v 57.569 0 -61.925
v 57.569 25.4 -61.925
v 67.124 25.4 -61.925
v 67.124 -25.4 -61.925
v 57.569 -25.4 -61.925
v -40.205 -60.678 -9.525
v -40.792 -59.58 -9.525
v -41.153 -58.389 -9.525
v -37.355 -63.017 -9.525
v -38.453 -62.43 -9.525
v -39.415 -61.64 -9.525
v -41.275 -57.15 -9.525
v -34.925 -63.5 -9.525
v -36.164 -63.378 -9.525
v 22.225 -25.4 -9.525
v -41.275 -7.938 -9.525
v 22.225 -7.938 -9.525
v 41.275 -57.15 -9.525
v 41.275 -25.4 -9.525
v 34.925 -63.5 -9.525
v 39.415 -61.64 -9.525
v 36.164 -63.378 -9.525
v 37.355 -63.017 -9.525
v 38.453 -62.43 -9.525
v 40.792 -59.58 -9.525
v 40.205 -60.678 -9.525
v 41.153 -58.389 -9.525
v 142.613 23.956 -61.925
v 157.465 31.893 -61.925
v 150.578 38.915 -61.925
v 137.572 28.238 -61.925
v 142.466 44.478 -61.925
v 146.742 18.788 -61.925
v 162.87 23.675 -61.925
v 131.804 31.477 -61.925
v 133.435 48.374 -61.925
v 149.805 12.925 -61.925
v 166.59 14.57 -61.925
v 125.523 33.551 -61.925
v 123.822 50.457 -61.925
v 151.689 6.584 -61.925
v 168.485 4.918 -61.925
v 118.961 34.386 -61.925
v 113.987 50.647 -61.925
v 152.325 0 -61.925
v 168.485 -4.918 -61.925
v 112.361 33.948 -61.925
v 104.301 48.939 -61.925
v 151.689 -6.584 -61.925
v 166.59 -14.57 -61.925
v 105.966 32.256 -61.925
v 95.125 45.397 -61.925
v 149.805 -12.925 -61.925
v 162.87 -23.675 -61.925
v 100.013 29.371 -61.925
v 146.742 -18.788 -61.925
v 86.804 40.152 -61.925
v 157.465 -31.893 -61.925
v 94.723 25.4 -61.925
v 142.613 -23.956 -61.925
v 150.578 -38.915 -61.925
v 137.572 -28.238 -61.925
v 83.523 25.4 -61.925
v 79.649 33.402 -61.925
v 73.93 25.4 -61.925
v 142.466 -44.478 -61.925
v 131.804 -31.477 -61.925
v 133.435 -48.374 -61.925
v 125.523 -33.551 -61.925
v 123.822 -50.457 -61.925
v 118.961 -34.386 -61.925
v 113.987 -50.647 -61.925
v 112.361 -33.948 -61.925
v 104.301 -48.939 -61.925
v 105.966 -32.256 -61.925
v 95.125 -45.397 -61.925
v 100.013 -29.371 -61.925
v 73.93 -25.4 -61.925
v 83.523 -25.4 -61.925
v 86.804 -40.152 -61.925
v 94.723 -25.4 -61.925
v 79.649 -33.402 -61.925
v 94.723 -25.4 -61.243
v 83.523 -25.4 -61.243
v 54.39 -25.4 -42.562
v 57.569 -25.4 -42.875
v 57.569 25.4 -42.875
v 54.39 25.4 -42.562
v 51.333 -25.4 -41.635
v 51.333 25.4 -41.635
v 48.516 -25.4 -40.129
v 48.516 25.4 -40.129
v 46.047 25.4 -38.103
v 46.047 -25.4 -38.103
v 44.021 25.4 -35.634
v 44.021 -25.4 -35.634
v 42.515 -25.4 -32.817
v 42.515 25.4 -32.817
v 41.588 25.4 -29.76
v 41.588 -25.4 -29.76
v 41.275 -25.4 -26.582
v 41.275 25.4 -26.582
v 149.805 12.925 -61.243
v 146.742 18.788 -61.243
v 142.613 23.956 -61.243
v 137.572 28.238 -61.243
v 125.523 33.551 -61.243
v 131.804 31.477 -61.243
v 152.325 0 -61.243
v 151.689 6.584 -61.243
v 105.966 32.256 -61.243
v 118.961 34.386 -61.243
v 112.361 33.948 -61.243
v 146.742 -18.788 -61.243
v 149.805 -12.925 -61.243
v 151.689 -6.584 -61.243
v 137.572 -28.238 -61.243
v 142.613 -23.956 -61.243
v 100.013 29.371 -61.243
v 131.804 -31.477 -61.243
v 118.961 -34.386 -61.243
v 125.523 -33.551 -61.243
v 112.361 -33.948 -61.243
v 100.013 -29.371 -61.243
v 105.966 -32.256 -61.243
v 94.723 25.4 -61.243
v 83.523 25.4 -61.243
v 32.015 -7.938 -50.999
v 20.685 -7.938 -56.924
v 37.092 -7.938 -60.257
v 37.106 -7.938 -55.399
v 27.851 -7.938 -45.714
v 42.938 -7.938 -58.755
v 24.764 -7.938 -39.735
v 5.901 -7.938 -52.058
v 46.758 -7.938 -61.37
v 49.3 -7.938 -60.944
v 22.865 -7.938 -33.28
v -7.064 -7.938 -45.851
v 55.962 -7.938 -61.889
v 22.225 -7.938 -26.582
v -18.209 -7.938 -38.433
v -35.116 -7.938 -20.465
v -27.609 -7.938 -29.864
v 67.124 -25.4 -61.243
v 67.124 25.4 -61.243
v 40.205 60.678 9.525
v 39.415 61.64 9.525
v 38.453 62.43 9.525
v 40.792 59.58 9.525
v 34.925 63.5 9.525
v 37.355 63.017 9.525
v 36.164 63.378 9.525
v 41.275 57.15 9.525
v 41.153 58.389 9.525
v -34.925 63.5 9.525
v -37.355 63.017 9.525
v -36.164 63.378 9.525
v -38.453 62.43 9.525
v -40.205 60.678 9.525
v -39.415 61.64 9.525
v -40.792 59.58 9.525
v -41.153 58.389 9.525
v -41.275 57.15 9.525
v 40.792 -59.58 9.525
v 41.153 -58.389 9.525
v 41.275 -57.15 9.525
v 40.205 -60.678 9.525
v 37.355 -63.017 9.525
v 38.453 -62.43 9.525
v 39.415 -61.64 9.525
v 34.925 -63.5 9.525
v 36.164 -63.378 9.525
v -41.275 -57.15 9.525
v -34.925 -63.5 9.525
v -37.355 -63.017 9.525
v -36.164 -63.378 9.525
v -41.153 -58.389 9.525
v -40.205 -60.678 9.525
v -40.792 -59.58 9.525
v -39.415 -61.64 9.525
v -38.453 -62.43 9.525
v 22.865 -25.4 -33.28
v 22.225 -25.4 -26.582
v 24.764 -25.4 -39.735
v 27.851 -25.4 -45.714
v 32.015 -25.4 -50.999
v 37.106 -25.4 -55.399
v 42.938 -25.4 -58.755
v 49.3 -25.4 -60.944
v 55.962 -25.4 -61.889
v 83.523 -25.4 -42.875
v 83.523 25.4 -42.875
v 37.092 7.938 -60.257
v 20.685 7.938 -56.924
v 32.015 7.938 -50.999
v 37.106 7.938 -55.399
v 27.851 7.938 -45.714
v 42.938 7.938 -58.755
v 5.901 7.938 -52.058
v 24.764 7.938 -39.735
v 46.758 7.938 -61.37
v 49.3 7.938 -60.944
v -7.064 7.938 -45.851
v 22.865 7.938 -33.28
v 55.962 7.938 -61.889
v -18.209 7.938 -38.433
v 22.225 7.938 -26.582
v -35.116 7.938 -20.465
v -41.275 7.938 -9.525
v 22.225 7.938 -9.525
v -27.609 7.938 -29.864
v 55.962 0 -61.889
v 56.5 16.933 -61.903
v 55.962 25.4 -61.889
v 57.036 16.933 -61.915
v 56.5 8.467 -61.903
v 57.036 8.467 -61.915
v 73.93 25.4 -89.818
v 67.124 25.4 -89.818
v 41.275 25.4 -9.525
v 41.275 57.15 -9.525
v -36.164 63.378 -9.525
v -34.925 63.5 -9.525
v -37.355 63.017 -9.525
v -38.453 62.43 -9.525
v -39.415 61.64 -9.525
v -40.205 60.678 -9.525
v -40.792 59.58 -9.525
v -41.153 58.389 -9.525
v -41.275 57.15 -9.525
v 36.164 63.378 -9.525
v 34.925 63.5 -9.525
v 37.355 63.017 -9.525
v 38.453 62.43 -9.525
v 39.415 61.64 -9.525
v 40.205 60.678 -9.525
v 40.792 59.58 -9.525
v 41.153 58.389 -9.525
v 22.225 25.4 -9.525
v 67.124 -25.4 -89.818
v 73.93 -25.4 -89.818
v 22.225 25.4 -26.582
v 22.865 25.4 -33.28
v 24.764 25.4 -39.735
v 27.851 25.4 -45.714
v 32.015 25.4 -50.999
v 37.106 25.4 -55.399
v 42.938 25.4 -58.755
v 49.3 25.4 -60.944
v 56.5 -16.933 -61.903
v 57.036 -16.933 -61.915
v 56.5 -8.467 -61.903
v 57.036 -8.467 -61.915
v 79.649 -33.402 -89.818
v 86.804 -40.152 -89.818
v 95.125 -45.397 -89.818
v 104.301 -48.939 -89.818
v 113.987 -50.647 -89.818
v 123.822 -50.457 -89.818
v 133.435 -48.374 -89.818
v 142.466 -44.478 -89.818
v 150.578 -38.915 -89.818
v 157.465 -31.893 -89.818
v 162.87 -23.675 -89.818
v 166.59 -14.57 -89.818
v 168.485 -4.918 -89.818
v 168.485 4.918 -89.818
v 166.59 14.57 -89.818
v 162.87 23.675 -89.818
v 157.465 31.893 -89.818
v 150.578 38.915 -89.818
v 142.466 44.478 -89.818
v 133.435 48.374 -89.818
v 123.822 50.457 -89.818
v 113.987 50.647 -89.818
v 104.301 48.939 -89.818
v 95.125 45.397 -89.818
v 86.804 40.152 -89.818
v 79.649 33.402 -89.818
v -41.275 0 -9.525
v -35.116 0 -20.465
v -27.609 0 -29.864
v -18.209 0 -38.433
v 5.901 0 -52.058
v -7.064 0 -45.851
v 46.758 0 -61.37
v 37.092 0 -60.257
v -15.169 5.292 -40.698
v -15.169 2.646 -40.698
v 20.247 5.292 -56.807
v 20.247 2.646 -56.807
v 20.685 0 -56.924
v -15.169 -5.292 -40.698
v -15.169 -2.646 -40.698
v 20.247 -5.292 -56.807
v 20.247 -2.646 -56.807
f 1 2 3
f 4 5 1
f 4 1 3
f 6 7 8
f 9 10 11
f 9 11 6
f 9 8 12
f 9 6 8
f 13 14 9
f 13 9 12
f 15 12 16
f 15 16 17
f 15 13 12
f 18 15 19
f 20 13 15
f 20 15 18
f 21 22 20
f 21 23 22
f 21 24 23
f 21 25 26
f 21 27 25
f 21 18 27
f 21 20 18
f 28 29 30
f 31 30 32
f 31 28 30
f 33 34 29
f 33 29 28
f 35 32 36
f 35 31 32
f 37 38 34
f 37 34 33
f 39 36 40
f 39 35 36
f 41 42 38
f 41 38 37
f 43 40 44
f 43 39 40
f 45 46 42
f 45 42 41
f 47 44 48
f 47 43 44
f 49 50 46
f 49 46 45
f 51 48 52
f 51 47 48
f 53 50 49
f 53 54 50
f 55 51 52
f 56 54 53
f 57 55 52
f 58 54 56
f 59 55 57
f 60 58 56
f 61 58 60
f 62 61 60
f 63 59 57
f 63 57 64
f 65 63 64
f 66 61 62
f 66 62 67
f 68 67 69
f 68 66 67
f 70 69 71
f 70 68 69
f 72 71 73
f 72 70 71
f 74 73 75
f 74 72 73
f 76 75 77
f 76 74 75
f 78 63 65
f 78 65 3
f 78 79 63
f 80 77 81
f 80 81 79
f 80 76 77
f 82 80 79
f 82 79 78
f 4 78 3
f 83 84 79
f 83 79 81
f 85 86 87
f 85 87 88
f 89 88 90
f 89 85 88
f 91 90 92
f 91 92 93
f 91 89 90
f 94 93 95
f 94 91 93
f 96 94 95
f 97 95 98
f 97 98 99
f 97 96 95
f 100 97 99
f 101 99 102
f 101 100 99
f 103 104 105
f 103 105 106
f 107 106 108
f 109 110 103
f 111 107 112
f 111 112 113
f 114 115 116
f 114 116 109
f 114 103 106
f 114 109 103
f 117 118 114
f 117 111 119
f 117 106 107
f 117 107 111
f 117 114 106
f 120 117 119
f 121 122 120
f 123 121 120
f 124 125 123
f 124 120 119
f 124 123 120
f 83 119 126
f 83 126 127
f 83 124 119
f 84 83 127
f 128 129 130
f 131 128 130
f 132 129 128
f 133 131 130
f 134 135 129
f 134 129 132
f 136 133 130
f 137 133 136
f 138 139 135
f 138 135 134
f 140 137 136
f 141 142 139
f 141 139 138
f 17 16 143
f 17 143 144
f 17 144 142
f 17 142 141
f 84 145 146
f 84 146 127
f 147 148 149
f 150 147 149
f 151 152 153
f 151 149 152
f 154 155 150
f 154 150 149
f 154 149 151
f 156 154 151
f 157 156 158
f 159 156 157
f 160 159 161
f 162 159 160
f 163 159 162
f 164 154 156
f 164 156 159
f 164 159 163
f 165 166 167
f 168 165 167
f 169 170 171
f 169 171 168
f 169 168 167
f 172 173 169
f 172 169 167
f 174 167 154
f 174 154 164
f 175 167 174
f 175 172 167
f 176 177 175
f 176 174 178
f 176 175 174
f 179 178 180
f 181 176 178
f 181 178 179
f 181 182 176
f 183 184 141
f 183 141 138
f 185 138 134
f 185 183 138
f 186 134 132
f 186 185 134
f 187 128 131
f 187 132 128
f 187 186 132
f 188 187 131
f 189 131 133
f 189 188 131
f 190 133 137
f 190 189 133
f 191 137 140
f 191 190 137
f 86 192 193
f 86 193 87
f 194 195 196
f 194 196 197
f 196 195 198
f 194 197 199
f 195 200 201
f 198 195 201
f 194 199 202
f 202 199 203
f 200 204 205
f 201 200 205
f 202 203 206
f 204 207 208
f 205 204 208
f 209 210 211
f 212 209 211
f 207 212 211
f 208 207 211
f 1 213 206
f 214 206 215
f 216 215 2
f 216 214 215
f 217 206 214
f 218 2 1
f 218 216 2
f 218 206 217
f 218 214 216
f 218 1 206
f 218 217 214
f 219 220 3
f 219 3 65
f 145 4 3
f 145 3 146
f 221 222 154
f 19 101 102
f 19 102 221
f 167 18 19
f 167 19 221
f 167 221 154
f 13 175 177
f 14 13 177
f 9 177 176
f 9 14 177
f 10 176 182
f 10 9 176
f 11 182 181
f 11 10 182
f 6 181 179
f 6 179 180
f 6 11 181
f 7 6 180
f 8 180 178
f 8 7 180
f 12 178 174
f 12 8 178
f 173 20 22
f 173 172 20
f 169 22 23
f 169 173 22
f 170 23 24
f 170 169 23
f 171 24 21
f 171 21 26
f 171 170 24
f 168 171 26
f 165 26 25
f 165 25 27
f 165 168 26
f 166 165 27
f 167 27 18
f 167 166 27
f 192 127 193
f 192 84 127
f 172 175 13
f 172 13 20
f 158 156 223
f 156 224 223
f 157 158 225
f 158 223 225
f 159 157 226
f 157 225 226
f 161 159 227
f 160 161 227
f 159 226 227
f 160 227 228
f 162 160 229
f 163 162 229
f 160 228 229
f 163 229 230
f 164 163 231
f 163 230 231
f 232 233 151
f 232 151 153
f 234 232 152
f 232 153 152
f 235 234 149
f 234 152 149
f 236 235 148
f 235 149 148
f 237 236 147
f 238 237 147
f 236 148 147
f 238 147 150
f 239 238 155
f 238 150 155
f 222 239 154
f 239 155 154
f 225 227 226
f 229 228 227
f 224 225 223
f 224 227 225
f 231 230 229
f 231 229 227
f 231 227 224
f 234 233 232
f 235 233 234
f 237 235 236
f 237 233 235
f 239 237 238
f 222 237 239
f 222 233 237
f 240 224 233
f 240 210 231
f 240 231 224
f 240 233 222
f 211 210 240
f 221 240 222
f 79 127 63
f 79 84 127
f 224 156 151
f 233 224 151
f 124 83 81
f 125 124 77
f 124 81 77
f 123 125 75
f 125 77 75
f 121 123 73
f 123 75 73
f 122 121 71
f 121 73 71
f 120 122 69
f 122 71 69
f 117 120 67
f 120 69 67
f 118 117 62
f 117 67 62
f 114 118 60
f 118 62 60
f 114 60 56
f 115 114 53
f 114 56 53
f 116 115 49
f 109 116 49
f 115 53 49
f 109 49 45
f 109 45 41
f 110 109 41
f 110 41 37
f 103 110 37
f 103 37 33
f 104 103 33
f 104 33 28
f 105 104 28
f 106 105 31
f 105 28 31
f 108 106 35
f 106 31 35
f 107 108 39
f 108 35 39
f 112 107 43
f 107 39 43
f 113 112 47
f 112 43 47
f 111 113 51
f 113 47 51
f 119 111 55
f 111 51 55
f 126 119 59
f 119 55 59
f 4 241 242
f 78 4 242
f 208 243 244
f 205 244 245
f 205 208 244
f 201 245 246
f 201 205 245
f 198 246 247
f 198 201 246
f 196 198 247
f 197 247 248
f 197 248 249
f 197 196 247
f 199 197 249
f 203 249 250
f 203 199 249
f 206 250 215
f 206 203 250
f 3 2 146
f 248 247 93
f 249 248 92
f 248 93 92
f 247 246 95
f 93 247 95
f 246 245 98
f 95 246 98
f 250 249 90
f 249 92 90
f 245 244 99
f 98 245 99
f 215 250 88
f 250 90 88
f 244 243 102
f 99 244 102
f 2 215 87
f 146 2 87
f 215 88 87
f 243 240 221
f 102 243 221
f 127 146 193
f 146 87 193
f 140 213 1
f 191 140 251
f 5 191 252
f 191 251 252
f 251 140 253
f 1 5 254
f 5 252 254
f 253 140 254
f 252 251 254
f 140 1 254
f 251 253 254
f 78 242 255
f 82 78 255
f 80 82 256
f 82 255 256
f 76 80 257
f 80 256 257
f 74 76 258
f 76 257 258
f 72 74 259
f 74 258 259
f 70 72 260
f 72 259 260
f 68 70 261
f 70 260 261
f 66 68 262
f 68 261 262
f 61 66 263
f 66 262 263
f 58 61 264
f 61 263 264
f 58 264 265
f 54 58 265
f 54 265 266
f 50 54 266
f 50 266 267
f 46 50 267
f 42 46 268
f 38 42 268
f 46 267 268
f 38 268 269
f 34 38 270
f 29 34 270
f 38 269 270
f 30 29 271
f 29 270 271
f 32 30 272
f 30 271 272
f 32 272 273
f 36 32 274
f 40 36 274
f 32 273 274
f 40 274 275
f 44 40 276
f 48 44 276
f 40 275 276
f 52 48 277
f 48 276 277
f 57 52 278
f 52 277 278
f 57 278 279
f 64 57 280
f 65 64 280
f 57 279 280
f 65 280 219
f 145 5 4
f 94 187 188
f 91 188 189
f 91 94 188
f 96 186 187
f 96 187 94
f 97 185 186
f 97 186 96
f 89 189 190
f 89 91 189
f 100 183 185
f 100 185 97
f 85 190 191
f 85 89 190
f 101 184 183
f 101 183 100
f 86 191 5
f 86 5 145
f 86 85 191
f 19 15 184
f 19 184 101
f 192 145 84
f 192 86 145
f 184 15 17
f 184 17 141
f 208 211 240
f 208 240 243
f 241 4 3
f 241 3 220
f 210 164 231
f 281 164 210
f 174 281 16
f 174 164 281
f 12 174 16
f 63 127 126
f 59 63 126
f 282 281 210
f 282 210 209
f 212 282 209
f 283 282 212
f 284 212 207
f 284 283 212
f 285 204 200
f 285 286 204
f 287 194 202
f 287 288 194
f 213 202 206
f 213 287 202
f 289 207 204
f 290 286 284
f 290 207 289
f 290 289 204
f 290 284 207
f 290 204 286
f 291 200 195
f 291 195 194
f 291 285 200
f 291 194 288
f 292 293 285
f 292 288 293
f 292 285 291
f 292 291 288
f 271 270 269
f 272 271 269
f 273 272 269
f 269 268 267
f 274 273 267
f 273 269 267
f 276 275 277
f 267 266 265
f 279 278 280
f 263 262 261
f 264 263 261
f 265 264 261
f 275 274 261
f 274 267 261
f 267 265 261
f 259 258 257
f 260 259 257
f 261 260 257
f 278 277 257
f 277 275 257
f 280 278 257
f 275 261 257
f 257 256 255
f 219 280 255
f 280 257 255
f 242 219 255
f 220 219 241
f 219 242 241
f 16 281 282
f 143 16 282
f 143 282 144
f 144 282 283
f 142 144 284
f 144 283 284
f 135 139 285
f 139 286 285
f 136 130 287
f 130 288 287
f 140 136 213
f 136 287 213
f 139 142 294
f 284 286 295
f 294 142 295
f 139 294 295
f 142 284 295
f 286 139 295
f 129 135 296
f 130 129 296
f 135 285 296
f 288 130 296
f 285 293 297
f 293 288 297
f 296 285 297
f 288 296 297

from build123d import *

# Parameters (mm, degrees)
F1_DEPTH = 63.5
F2_DEPTH = 25.4
F3_DEPTH = 7.9375
F5_R     = 6.35
F6_R     = 6.35


with BuildPart() as f1:
    # F0 (on Front) → F1 (new body, symmetric)
    with BuildSketch(Plane.XZ):
        Polygon((41.275, 9.525), (-41.275, 9.525), (-41.275, -9.525), (22.225, -9.525), (41.275, -9.525), align=None)
    extrude(amount=F1_DEPTH, both=True)

    # F0 (on Front) → F2 (join, symmetric)
    with BuildSketch(Plane.XZ):
        with BuildLine():
            Line((41.275, -26.581538), (41.275, -9.525))
            Line((41.275, -9.525), (22.225, -9.525))
            Line((22.225, -9.525), (22.225, -26.581538))
            ThreePointArc((22.225, -26.581538), (32.015305, -50.998753), (55.962329, -61.888678))
            add(Edge.make_bspline(
                [(55.962329, -61.888678), (56.50135, -61.903648), (57.036854, -61.915795), (57.568662, -61.9252)],
                knots=[110.068778, 110.068778, 110.068778, 110.068778, 111.874262, 111.874262, 111.874262, 111.874262], degree=3))
            Line((57.568662, -61.9252), (67.124001, -61.9252))
            Line((67.124001, -61.9252), (67.124001, -61.242696))
            Line((67.124001, -61.242696), (83.522829, -61.242696))
            Line((83.522829, -61.242696), (83.522829, -42.8752))
            Line((83.522829, -42.8752), (57.568662, -42.8752))
            ThreePointArc((57.568662, -42.8752), (46.047303, -38.102897), (41.275, -26.581538))
        make_face()
        Polygon((83.522829, -61.9252), (67.124001, -61.9252), (67.124001, -89.817696), (117.924001, -89.817696), (117.924001, -61.242696), (83.522829, -61.242696), align=None)
    extrude(amount=F2_DEPTH, both=True)

    # F0 (on Front) → F3 (join, symmetric)
    with BuildSketch(Plane.XZ):
        with BuildLine():
            Line((22.225, -9.525), (-41.275, -9.525))
            add(Edge.make_bspline(
                [(-41.275, -9.525), (-22.828837, -49.573984), (23.101689, -60.976075), (55.962329, -61.888678)],
                knots=[0, 0, 0, 0, 110.068778, 110.068778, 110.068778, 110.068778], degree=3))
            ThreePointArc((55.962329, -61.888678), (32.015305, -50.998753), (22.225, -26.581538))
            Line((22.225, -26.581538), (22.225, -9.525))
        make_face()
    extrude(amount=F3_DEPTH, both=True)

    # F0 (on Front) → F4 (revolve)
    with BuildSketch(Plane.XZ):
        Polygon((83.522829, -61.9252), (67.124001, -61.9252), (67.124001, -89.817696), (117.924001, -89.817696), (117.924001, -61.242696), (83.522829, -61.242696), align=None)
    revolve(axis=Axis((117.924001, 0, -75.530196), (0, 0, 1)))

    # F5
    f5_edges = [f1.edges().sort_by_distance(p)[0] for p in [
        (41.275, 63.5, 0),
        (41.275, -63.5, 0),
        (-41.275, -63.5, 0),
    ]]
    fillet(f5_edges, radius=F5_R)

    # F6
    f6_edges = [f1.edges().sort_by_distance(p)[0] for p in [
        (-41.275, 63.5, 0),
    ]]
    fillet(f6_edges, radius=F6_R)


solid = f1.part
